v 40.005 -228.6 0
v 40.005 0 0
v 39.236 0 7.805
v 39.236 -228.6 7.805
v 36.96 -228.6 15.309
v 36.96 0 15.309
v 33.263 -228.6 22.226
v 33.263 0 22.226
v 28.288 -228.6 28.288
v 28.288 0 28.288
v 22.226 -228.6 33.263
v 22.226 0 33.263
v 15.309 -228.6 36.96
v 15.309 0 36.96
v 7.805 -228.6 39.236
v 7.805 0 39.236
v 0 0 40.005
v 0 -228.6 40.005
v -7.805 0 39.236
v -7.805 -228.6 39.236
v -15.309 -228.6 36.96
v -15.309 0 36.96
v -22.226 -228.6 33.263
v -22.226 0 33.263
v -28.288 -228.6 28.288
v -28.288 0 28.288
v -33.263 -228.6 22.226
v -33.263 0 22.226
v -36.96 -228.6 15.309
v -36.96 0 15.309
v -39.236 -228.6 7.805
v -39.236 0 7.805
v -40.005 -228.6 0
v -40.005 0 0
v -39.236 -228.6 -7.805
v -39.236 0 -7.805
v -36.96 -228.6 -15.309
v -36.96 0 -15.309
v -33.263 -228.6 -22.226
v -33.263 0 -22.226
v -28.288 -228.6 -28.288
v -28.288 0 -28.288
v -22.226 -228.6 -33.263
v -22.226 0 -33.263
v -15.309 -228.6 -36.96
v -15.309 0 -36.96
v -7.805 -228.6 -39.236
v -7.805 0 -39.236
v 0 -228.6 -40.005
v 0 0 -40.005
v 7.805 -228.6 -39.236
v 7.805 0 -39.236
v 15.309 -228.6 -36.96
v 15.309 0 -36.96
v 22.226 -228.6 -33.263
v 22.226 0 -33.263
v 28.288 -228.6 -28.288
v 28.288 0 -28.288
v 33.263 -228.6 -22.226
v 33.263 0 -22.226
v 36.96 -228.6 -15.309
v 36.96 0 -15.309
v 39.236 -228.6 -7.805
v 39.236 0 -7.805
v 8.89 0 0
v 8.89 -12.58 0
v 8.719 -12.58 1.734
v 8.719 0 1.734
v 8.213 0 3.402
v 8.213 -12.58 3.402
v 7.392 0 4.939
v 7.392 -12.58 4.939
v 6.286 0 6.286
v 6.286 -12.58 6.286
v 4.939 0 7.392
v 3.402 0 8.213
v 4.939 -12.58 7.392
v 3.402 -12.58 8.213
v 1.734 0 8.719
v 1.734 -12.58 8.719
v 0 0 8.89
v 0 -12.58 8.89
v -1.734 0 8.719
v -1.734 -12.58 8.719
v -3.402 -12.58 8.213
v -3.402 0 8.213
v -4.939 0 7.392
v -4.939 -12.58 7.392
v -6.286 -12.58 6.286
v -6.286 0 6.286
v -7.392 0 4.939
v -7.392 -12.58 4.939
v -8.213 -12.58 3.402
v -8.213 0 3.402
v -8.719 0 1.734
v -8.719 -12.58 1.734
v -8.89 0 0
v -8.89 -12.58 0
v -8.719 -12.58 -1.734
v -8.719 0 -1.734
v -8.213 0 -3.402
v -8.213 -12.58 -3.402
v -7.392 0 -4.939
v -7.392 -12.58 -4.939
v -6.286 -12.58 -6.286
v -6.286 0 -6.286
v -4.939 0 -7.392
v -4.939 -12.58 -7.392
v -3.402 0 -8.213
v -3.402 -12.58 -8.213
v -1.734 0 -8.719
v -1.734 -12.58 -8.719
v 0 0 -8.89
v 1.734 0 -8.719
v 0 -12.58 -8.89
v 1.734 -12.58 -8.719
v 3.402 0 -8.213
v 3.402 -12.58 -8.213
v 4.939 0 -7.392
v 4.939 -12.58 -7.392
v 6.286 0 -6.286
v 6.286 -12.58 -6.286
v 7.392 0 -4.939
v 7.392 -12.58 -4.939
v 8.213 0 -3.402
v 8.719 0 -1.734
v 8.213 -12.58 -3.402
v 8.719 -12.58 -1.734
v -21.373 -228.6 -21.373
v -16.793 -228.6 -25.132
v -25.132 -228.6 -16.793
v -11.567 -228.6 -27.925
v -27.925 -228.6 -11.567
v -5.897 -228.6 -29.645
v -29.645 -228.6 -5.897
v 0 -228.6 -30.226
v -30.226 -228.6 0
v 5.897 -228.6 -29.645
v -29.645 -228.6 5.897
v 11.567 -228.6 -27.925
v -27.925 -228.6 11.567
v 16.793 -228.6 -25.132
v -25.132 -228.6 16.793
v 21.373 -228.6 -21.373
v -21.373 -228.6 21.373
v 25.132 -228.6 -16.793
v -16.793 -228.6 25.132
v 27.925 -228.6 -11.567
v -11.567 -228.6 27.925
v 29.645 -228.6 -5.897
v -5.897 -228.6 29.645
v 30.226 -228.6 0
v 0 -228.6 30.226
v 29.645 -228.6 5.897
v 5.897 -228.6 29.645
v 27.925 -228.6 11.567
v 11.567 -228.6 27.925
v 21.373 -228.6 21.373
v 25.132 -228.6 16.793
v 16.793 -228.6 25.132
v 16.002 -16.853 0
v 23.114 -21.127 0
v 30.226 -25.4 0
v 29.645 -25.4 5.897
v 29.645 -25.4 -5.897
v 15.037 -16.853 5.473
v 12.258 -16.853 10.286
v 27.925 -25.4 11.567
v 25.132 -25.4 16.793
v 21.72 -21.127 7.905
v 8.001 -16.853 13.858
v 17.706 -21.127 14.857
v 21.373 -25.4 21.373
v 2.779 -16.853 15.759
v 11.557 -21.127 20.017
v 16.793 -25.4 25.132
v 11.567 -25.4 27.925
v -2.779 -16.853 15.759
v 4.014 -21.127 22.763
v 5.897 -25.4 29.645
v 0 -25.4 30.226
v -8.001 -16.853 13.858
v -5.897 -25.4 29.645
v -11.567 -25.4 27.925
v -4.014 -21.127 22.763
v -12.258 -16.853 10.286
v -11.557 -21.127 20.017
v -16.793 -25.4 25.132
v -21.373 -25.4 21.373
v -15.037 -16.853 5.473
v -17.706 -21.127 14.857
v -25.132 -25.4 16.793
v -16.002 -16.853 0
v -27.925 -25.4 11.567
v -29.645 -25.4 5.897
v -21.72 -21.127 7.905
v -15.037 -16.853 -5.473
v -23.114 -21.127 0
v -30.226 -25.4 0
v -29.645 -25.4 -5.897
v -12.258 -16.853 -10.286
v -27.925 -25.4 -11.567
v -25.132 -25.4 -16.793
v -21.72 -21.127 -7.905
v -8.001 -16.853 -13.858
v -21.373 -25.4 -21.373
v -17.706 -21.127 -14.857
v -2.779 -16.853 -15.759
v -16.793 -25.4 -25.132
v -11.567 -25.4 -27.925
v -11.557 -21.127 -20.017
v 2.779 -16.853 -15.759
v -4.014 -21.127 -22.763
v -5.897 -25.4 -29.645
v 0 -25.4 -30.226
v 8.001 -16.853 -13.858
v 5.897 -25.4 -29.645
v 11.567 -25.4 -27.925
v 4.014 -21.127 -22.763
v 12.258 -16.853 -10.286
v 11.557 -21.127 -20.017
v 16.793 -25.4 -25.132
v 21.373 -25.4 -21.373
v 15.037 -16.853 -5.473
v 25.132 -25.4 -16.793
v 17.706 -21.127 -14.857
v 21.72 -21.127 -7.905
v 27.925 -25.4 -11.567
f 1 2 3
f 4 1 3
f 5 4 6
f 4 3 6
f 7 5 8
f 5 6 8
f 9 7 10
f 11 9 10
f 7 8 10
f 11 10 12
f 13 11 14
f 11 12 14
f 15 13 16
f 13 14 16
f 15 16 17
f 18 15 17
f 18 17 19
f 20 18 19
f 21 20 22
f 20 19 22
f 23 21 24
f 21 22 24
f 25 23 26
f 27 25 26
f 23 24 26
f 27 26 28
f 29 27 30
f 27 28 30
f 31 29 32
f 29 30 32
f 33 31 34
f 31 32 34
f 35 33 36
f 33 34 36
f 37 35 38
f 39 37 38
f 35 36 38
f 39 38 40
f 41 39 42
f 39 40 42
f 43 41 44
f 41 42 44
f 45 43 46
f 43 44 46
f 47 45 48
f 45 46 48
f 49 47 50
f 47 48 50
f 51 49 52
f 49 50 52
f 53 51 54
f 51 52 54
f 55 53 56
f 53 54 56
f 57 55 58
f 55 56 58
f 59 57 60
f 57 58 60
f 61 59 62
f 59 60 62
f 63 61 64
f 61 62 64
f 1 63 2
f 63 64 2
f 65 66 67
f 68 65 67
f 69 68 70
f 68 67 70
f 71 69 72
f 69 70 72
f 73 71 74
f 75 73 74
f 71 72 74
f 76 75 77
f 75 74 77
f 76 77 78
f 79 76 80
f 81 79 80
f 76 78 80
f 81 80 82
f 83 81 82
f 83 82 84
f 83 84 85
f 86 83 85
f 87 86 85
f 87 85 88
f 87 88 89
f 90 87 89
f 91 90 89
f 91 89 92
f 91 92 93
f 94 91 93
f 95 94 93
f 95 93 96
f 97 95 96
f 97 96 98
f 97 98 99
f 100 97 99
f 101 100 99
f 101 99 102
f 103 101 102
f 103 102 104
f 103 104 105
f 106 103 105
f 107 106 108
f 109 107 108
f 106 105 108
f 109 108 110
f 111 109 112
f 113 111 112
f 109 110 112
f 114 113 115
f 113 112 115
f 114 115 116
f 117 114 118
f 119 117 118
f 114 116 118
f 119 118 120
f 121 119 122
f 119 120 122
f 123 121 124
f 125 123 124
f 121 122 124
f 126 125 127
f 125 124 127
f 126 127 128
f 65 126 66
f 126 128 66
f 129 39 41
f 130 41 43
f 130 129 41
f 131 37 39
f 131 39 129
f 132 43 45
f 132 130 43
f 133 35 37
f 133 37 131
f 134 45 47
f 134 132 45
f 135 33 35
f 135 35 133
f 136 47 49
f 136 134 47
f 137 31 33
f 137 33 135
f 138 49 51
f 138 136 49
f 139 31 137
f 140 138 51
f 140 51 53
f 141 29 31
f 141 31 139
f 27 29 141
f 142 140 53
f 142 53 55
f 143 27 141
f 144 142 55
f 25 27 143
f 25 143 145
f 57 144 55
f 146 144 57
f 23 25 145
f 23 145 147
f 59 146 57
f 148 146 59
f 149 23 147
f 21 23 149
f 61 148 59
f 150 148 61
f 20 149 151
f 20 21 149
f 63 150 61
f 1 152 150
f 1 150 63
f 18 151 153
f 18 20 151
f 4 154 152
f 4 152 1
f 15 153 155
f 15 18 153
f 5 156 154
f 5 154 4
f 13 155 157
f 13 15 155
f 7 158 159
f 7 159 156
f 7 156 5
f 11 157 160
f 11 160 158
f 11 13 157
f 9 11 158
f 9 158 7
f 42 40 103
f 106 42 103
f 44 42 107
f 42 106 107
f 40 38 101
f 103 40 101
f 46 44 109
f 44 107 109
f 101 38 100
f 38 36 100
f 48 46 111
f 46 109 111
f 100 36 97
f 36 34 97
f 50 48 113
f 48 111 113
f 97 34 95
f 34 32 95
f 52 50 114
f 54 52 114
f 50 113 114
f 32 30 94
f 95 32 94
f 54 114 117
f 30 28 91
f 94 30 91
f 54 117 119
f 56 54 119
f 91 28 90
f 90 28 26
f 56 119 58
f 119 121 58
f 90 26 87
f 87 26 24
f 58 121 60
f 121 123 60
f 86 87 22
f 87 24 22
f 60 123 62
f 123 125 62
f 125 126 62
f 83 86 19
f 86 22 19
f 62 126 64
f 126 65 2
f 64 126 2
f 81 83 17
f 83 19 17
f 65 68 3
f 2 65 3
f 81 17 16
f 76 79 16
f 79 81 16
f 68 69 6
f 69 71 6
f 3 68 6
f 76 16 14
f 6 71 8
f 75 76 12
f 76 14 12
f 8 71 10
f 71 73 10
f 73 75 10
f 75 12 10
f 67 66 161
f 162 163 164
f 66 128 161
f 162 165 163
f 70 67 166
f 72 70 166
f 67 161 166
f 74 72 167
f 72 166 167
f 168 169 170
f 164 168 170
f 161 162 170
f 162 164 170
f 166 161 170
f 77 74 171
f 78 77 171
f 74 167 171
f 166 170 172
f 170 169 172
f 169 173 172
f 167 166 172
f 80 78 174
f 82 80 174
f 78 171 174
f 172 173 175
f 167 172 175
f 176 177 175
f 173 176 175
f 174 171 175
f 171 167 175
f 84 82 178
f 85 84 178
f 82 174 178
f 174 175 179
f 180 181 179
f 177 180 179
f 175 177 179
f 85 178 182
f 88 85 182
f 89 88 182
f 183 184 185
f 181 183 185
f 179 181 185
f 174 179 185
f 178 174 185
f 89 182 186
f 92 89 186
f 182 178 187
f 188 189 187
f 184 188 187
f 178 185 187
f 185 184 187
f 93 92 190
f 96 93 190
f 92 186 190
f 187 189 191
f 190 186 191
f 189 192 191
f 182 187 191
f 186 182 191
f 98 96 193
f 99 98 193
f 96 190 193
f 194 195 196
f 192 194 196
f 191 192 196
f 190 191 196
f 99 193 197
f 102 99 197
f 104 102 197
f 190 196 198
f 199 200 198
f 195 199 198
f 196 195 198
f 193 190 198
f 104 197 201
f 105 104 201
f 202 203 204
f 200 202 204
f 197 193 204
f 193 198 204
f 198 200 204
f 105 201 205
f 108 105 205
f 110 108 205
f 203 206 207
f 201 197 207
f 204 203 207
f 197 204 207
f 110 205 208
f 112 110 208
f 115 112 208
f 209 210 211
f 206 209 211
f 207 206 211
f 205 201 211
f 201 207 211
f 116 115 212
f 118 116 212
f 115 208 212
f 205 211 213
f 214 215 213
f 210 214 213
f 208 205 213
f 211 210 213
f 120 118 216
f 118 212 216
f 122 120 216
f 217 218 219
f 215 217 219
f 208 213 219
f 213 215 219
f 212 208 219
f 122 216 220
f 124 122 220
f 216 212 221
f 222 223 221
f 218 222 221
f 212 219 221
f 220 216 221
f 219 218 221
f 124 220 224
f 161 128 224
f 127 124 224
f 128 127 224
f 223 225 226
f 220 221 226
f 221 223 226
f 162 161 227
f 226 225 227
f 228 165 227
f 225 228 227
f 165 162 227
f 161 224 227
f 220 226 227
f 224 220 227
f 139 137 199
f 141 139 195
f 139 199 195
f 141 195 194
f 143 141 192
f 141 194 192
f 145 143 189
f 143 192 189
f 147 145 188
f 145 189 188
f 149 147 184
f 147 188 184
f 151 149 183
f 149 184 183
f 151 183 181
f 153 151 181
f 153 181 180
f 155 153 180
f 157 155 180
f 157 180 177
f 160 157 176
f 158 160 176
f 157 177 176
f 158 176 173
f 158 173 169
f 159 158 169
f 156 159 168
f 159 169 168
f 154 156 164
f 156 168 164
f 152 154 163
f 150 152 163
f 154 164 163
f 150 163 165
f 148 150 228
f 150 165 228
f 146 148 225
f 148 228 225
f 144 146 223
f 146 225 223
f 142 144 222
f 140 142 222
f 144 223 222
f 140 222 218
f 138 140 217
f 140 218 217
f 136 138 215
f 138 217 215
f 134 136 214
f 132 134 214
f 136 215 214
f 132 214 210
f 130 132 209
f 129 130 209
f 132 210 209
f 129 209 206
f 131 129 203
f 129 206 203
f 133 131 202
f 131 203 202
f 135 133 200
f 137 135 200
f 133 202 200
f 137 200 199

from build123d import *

# Parameters (mm, degrees)
F0_R     = 40.005
F1_DEPTH = 228.6
F3_D     = 60.452
F3_DEPTH = 203.2
F3_TIP   = 18.1616130707
F5_D     = 17.78


with BuildPart() as f1:
    # F0 (on Front) → F1 (new body)
    with BuildSketch(Plane.XZ):
        Circle(F0_R)
    extrude(amount=F1_DEPTH)

    # F3
    with Locations(Plane.XZ.offset(228.6)):
        with Locations((0, 0)):
            Hole(F3_D / 2, depth=F3_DEPTH)
            with Locations((0, 0, -(F3_DEPTH + F3_TIP / 2))):  # 118° drill point
                Cone(0, F3_D / 2, F3_TIP, mode=Mode.SUBTRACT)

    # F5 (through all)
    with Locations(Plane(origin=(0, 0, 0), x_dir=(-1, 0, 0), z_dir=(0, 1, 0))):
        with Locations((0, 0)):
            Hole(F5_D / 2)


solid = f1.part
